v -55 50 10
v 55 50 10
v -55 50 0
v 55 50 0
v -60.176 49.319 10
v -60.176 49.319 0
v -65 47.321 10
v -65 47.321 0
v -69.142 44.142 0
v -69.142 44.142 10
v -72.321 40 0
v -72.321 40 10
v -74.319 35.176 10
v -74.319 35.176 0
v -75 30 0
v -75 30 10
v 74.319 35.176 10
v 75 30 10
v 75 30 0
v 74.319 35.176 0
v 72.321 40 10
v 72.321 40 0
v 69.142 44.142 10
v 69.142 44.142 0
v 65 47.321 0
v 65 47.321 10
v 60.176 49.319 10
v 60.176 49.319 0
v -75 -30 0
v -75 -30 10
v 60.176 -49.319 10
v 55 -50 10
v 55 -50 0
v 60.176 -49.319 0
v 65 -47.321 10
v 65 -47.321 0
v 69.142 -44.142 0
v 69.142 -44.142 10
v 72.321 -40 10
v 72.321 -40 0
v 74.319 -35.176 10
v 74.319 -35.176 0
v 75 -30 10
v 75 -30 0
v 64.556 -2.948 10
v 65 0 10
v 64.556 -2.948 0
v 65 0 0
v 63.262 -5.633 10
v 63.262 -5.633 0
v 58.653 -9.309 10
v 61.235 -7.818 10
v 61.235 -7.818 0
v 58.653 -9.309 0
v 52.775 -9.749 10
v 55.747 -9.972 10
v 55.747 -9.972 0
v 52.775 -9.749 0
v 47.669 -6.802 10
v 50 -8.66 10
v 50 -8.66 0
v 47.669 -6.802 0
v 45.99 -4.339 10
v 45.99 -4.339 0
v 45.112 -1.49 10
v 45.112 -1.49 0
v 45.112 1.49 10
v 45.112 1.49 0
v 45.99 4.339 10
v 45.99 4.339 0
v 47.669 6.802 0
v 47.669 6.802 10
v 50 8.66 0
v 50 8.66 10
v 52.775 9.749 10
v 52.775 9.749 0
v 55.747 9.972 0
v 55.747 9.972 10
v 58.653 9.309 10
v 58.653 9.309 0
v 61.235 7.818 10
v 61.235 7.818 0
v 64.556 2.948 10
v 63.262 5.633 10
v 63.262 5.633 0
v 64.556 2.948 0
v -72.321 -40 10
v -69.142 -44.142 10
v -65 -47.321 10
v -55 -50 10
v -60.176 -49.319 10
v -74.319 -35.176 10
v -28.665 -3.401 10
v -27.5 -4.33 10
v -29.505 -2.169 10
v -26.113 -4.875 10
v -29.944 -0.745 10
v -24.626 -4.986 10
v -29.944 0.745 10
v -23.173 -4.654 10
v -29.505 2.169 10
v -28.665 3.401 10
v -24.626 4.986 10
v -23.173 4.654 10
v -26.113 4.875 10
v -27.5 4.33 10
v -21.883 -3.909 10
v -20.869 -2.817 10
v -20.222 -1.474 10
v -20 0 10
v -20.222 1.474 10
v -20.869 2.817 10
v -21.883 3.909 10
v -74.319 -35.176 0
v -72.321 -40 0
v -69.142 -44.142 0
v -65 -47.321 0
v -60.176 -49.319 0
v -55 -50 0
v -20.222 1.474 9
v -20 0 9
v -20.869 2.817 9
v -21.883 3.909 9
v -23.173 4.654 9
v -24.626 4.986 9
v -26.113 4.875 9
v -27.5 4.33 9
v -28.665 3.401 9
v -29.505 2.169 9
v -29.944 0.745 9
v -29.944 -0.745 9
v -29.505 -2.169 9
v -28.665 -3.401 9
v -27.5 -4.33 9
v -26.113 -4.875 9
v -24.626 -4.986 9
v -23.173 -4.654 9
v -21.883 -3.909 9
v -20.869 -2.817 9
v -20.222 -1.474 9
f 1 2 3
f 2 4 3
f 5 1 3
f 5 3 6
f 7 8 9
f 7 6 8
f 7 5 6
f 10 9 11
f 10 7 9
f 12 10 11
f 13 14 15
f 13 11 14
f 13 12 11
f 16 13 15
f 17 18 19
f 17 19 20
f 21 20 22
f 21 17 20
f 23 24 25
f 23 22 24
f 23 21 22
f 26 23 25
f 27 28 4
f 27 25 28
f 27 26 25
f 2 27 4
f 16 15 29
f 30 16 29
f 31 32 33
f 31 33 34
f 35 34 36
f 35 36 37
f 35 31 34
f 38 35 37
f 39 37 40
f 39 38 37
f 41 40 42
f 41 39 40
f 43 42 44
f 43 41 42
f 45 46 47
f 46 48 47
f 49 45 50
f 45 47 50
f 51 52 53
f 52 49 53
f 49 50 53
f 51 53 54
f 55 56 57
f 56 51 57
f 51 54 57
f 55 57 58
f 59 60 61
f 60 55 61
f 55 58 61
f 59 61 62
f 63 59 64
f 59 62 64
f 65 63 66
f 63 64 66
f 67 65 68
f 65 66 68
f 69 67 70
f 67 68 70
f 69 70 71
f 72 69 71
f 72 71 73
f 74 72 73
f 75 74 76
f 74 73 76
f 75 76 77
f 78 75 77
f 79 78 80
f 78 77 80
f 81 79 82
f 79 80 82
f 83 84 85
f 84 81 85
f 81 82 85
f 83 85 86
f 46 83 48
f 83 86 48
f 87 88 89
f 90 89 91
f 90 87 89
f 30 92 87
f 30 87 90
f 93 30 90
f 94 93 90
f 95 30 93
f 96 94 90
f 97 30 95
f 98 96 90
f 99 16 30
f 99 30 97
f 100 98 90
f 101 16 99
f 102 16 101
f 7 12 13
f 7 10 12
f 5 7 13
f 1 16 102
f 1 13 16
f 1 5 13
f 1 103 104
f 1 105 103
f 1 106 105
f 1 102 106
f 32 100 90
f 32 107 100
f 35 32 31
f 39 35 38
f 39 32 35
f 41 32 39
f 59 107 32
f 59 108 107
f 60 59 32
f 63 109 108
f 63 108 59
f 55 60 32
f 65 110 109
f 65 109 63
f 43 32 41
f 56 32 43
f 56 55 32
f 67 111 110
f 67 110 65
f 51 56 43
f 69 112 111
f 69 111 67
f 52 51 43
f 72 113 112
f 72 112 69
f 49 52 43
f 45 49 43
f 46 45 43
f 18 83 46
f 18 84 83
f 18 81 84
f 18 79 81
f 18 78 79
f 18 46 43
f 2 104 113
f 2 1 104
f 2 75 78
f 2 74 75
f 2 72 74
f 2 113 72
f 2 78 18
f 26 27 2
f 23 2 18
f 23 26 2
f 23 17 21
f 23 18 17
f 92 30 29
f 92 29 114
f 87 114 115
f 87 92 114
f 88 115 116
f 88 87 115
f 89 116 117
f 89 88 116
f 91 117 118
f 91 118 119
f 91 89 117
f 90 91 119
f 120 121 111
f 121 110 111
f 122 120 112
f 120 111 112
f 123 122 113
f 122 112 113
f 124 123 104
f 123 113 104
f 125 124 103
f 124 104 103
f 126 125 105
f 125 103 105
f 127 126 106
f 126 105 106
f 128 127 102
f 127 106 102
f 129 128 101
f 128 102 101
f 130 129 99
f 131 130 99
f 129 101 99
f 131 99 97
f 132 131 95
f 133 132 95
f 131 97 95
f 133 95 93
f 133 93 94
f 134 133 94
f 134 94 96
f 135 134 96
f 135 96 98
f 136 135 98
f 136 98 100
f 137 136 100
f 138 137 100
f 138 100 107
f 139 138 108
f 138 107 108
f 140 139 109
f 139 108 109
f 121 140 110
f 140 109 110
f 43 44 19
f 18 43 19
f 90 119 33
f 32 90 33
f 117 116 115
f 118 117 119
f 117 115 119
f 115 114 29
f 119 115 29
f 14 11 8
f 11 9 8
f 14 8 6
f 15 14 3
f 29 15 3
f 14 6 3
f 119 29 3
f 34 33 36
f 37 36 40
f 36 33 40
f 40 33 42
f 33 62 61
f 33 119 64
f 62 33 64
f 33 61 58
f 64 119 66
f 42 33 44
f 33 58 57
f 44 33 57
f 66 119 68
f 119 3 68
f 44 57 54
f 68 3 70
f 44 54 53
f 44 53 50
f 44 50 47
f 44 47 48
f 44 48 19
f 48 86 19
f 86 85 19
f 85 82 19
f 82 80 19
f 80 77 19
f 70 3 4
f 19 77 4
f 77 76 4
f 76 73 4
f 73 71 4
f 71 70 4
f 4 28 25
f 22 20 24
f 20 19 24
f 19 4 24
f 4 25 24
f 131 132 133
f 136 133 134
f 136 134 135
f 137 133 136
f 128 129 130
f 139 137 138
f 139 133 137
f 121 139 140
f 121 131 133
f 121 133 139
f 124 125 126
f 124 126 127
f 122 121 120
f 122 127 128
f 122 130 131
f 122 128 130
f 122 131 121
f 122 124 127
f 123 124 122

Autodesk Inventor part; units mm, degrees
ref_plane "YZ Plane" through (0, 0, 0) normal (1, 0, 0) x (0, 1, 0)
ref_plane "XZ Plane" through (0, 0, 0) normal (0, 1, 0) x (-1, 0, 0)
ref_plane "XY Plane" through (0, 0, 0) normal (0, 0, 1) x (1, 0, 0)
sketch "Sketch1" plane through (0, 0, 0) normal (0, 0, 1) x (1, 0, 0)
  line L0 (-75, -50) -> (75, -50)
  line L1 (75, -50) -> (75, 50)
  line L2 (75, 50) -> (-75, 50)
  line L3 (-75, 50) -> (-75, -50)
  line L4 (-75, -50) -> (75, 50) construction
  line L5 (75, -50) -> (-75, 50) construction
  circle A0 centre (55, -30) radius 10
  circle A1 centre (55, 30) radius 10
  line L6 (0, 0) -> (75, 0) construction
  circle A2 centre (55, 0) radius 10
  dimension "d0" = 150
  dimension "d1" = 100
  dimension "d23" = 20
  dimension "d25" = 20
  dimension "d26" = 20
extrude "Plate1" add sketch "Sketch1" along normal blind 10 contours L3 L2 L1 L0 | A0 | A1
fillet "Corner Round1" radius 20 4 edges at (75, -50, 5) (-75, -50, 5) (-75, 50, 5) (75, 50, 5)
sketch "Sketch5" plane through (0, 0, 10) normal (0, 0, 1) x (1, 0, 0)
  line L0 (55, -50) -> (-55, -50) projected
  line L1 (-75, -30) -> (-75, 30) projected
  line L2 (-55, 50) -> (55, 50) projected
  circle A0 centre (-25, 0) radius 50
  circle A1 centre (-25, 0) radius 5
  point P0 (0, 0)
  dimension "d27" = 10
extrude "Extrusion2" cut sketch "Sketch5" against normal blind 1 contours A1
equation "\"d26\" = d25"
equation "\"d2\" = Thickness"
equation "\"BendReliefDepth\" = 0.5 * Thickness"
equation "\"TransitionRadius\" = BendRadius"
equation "\"JacobiRadiusSize\" = BendRadius"
equation "\"Thickness\" = 10"
equation "\"BendRadius\" = 5"
properties part number "PNS-783 leg floor plate" material "Steel"
